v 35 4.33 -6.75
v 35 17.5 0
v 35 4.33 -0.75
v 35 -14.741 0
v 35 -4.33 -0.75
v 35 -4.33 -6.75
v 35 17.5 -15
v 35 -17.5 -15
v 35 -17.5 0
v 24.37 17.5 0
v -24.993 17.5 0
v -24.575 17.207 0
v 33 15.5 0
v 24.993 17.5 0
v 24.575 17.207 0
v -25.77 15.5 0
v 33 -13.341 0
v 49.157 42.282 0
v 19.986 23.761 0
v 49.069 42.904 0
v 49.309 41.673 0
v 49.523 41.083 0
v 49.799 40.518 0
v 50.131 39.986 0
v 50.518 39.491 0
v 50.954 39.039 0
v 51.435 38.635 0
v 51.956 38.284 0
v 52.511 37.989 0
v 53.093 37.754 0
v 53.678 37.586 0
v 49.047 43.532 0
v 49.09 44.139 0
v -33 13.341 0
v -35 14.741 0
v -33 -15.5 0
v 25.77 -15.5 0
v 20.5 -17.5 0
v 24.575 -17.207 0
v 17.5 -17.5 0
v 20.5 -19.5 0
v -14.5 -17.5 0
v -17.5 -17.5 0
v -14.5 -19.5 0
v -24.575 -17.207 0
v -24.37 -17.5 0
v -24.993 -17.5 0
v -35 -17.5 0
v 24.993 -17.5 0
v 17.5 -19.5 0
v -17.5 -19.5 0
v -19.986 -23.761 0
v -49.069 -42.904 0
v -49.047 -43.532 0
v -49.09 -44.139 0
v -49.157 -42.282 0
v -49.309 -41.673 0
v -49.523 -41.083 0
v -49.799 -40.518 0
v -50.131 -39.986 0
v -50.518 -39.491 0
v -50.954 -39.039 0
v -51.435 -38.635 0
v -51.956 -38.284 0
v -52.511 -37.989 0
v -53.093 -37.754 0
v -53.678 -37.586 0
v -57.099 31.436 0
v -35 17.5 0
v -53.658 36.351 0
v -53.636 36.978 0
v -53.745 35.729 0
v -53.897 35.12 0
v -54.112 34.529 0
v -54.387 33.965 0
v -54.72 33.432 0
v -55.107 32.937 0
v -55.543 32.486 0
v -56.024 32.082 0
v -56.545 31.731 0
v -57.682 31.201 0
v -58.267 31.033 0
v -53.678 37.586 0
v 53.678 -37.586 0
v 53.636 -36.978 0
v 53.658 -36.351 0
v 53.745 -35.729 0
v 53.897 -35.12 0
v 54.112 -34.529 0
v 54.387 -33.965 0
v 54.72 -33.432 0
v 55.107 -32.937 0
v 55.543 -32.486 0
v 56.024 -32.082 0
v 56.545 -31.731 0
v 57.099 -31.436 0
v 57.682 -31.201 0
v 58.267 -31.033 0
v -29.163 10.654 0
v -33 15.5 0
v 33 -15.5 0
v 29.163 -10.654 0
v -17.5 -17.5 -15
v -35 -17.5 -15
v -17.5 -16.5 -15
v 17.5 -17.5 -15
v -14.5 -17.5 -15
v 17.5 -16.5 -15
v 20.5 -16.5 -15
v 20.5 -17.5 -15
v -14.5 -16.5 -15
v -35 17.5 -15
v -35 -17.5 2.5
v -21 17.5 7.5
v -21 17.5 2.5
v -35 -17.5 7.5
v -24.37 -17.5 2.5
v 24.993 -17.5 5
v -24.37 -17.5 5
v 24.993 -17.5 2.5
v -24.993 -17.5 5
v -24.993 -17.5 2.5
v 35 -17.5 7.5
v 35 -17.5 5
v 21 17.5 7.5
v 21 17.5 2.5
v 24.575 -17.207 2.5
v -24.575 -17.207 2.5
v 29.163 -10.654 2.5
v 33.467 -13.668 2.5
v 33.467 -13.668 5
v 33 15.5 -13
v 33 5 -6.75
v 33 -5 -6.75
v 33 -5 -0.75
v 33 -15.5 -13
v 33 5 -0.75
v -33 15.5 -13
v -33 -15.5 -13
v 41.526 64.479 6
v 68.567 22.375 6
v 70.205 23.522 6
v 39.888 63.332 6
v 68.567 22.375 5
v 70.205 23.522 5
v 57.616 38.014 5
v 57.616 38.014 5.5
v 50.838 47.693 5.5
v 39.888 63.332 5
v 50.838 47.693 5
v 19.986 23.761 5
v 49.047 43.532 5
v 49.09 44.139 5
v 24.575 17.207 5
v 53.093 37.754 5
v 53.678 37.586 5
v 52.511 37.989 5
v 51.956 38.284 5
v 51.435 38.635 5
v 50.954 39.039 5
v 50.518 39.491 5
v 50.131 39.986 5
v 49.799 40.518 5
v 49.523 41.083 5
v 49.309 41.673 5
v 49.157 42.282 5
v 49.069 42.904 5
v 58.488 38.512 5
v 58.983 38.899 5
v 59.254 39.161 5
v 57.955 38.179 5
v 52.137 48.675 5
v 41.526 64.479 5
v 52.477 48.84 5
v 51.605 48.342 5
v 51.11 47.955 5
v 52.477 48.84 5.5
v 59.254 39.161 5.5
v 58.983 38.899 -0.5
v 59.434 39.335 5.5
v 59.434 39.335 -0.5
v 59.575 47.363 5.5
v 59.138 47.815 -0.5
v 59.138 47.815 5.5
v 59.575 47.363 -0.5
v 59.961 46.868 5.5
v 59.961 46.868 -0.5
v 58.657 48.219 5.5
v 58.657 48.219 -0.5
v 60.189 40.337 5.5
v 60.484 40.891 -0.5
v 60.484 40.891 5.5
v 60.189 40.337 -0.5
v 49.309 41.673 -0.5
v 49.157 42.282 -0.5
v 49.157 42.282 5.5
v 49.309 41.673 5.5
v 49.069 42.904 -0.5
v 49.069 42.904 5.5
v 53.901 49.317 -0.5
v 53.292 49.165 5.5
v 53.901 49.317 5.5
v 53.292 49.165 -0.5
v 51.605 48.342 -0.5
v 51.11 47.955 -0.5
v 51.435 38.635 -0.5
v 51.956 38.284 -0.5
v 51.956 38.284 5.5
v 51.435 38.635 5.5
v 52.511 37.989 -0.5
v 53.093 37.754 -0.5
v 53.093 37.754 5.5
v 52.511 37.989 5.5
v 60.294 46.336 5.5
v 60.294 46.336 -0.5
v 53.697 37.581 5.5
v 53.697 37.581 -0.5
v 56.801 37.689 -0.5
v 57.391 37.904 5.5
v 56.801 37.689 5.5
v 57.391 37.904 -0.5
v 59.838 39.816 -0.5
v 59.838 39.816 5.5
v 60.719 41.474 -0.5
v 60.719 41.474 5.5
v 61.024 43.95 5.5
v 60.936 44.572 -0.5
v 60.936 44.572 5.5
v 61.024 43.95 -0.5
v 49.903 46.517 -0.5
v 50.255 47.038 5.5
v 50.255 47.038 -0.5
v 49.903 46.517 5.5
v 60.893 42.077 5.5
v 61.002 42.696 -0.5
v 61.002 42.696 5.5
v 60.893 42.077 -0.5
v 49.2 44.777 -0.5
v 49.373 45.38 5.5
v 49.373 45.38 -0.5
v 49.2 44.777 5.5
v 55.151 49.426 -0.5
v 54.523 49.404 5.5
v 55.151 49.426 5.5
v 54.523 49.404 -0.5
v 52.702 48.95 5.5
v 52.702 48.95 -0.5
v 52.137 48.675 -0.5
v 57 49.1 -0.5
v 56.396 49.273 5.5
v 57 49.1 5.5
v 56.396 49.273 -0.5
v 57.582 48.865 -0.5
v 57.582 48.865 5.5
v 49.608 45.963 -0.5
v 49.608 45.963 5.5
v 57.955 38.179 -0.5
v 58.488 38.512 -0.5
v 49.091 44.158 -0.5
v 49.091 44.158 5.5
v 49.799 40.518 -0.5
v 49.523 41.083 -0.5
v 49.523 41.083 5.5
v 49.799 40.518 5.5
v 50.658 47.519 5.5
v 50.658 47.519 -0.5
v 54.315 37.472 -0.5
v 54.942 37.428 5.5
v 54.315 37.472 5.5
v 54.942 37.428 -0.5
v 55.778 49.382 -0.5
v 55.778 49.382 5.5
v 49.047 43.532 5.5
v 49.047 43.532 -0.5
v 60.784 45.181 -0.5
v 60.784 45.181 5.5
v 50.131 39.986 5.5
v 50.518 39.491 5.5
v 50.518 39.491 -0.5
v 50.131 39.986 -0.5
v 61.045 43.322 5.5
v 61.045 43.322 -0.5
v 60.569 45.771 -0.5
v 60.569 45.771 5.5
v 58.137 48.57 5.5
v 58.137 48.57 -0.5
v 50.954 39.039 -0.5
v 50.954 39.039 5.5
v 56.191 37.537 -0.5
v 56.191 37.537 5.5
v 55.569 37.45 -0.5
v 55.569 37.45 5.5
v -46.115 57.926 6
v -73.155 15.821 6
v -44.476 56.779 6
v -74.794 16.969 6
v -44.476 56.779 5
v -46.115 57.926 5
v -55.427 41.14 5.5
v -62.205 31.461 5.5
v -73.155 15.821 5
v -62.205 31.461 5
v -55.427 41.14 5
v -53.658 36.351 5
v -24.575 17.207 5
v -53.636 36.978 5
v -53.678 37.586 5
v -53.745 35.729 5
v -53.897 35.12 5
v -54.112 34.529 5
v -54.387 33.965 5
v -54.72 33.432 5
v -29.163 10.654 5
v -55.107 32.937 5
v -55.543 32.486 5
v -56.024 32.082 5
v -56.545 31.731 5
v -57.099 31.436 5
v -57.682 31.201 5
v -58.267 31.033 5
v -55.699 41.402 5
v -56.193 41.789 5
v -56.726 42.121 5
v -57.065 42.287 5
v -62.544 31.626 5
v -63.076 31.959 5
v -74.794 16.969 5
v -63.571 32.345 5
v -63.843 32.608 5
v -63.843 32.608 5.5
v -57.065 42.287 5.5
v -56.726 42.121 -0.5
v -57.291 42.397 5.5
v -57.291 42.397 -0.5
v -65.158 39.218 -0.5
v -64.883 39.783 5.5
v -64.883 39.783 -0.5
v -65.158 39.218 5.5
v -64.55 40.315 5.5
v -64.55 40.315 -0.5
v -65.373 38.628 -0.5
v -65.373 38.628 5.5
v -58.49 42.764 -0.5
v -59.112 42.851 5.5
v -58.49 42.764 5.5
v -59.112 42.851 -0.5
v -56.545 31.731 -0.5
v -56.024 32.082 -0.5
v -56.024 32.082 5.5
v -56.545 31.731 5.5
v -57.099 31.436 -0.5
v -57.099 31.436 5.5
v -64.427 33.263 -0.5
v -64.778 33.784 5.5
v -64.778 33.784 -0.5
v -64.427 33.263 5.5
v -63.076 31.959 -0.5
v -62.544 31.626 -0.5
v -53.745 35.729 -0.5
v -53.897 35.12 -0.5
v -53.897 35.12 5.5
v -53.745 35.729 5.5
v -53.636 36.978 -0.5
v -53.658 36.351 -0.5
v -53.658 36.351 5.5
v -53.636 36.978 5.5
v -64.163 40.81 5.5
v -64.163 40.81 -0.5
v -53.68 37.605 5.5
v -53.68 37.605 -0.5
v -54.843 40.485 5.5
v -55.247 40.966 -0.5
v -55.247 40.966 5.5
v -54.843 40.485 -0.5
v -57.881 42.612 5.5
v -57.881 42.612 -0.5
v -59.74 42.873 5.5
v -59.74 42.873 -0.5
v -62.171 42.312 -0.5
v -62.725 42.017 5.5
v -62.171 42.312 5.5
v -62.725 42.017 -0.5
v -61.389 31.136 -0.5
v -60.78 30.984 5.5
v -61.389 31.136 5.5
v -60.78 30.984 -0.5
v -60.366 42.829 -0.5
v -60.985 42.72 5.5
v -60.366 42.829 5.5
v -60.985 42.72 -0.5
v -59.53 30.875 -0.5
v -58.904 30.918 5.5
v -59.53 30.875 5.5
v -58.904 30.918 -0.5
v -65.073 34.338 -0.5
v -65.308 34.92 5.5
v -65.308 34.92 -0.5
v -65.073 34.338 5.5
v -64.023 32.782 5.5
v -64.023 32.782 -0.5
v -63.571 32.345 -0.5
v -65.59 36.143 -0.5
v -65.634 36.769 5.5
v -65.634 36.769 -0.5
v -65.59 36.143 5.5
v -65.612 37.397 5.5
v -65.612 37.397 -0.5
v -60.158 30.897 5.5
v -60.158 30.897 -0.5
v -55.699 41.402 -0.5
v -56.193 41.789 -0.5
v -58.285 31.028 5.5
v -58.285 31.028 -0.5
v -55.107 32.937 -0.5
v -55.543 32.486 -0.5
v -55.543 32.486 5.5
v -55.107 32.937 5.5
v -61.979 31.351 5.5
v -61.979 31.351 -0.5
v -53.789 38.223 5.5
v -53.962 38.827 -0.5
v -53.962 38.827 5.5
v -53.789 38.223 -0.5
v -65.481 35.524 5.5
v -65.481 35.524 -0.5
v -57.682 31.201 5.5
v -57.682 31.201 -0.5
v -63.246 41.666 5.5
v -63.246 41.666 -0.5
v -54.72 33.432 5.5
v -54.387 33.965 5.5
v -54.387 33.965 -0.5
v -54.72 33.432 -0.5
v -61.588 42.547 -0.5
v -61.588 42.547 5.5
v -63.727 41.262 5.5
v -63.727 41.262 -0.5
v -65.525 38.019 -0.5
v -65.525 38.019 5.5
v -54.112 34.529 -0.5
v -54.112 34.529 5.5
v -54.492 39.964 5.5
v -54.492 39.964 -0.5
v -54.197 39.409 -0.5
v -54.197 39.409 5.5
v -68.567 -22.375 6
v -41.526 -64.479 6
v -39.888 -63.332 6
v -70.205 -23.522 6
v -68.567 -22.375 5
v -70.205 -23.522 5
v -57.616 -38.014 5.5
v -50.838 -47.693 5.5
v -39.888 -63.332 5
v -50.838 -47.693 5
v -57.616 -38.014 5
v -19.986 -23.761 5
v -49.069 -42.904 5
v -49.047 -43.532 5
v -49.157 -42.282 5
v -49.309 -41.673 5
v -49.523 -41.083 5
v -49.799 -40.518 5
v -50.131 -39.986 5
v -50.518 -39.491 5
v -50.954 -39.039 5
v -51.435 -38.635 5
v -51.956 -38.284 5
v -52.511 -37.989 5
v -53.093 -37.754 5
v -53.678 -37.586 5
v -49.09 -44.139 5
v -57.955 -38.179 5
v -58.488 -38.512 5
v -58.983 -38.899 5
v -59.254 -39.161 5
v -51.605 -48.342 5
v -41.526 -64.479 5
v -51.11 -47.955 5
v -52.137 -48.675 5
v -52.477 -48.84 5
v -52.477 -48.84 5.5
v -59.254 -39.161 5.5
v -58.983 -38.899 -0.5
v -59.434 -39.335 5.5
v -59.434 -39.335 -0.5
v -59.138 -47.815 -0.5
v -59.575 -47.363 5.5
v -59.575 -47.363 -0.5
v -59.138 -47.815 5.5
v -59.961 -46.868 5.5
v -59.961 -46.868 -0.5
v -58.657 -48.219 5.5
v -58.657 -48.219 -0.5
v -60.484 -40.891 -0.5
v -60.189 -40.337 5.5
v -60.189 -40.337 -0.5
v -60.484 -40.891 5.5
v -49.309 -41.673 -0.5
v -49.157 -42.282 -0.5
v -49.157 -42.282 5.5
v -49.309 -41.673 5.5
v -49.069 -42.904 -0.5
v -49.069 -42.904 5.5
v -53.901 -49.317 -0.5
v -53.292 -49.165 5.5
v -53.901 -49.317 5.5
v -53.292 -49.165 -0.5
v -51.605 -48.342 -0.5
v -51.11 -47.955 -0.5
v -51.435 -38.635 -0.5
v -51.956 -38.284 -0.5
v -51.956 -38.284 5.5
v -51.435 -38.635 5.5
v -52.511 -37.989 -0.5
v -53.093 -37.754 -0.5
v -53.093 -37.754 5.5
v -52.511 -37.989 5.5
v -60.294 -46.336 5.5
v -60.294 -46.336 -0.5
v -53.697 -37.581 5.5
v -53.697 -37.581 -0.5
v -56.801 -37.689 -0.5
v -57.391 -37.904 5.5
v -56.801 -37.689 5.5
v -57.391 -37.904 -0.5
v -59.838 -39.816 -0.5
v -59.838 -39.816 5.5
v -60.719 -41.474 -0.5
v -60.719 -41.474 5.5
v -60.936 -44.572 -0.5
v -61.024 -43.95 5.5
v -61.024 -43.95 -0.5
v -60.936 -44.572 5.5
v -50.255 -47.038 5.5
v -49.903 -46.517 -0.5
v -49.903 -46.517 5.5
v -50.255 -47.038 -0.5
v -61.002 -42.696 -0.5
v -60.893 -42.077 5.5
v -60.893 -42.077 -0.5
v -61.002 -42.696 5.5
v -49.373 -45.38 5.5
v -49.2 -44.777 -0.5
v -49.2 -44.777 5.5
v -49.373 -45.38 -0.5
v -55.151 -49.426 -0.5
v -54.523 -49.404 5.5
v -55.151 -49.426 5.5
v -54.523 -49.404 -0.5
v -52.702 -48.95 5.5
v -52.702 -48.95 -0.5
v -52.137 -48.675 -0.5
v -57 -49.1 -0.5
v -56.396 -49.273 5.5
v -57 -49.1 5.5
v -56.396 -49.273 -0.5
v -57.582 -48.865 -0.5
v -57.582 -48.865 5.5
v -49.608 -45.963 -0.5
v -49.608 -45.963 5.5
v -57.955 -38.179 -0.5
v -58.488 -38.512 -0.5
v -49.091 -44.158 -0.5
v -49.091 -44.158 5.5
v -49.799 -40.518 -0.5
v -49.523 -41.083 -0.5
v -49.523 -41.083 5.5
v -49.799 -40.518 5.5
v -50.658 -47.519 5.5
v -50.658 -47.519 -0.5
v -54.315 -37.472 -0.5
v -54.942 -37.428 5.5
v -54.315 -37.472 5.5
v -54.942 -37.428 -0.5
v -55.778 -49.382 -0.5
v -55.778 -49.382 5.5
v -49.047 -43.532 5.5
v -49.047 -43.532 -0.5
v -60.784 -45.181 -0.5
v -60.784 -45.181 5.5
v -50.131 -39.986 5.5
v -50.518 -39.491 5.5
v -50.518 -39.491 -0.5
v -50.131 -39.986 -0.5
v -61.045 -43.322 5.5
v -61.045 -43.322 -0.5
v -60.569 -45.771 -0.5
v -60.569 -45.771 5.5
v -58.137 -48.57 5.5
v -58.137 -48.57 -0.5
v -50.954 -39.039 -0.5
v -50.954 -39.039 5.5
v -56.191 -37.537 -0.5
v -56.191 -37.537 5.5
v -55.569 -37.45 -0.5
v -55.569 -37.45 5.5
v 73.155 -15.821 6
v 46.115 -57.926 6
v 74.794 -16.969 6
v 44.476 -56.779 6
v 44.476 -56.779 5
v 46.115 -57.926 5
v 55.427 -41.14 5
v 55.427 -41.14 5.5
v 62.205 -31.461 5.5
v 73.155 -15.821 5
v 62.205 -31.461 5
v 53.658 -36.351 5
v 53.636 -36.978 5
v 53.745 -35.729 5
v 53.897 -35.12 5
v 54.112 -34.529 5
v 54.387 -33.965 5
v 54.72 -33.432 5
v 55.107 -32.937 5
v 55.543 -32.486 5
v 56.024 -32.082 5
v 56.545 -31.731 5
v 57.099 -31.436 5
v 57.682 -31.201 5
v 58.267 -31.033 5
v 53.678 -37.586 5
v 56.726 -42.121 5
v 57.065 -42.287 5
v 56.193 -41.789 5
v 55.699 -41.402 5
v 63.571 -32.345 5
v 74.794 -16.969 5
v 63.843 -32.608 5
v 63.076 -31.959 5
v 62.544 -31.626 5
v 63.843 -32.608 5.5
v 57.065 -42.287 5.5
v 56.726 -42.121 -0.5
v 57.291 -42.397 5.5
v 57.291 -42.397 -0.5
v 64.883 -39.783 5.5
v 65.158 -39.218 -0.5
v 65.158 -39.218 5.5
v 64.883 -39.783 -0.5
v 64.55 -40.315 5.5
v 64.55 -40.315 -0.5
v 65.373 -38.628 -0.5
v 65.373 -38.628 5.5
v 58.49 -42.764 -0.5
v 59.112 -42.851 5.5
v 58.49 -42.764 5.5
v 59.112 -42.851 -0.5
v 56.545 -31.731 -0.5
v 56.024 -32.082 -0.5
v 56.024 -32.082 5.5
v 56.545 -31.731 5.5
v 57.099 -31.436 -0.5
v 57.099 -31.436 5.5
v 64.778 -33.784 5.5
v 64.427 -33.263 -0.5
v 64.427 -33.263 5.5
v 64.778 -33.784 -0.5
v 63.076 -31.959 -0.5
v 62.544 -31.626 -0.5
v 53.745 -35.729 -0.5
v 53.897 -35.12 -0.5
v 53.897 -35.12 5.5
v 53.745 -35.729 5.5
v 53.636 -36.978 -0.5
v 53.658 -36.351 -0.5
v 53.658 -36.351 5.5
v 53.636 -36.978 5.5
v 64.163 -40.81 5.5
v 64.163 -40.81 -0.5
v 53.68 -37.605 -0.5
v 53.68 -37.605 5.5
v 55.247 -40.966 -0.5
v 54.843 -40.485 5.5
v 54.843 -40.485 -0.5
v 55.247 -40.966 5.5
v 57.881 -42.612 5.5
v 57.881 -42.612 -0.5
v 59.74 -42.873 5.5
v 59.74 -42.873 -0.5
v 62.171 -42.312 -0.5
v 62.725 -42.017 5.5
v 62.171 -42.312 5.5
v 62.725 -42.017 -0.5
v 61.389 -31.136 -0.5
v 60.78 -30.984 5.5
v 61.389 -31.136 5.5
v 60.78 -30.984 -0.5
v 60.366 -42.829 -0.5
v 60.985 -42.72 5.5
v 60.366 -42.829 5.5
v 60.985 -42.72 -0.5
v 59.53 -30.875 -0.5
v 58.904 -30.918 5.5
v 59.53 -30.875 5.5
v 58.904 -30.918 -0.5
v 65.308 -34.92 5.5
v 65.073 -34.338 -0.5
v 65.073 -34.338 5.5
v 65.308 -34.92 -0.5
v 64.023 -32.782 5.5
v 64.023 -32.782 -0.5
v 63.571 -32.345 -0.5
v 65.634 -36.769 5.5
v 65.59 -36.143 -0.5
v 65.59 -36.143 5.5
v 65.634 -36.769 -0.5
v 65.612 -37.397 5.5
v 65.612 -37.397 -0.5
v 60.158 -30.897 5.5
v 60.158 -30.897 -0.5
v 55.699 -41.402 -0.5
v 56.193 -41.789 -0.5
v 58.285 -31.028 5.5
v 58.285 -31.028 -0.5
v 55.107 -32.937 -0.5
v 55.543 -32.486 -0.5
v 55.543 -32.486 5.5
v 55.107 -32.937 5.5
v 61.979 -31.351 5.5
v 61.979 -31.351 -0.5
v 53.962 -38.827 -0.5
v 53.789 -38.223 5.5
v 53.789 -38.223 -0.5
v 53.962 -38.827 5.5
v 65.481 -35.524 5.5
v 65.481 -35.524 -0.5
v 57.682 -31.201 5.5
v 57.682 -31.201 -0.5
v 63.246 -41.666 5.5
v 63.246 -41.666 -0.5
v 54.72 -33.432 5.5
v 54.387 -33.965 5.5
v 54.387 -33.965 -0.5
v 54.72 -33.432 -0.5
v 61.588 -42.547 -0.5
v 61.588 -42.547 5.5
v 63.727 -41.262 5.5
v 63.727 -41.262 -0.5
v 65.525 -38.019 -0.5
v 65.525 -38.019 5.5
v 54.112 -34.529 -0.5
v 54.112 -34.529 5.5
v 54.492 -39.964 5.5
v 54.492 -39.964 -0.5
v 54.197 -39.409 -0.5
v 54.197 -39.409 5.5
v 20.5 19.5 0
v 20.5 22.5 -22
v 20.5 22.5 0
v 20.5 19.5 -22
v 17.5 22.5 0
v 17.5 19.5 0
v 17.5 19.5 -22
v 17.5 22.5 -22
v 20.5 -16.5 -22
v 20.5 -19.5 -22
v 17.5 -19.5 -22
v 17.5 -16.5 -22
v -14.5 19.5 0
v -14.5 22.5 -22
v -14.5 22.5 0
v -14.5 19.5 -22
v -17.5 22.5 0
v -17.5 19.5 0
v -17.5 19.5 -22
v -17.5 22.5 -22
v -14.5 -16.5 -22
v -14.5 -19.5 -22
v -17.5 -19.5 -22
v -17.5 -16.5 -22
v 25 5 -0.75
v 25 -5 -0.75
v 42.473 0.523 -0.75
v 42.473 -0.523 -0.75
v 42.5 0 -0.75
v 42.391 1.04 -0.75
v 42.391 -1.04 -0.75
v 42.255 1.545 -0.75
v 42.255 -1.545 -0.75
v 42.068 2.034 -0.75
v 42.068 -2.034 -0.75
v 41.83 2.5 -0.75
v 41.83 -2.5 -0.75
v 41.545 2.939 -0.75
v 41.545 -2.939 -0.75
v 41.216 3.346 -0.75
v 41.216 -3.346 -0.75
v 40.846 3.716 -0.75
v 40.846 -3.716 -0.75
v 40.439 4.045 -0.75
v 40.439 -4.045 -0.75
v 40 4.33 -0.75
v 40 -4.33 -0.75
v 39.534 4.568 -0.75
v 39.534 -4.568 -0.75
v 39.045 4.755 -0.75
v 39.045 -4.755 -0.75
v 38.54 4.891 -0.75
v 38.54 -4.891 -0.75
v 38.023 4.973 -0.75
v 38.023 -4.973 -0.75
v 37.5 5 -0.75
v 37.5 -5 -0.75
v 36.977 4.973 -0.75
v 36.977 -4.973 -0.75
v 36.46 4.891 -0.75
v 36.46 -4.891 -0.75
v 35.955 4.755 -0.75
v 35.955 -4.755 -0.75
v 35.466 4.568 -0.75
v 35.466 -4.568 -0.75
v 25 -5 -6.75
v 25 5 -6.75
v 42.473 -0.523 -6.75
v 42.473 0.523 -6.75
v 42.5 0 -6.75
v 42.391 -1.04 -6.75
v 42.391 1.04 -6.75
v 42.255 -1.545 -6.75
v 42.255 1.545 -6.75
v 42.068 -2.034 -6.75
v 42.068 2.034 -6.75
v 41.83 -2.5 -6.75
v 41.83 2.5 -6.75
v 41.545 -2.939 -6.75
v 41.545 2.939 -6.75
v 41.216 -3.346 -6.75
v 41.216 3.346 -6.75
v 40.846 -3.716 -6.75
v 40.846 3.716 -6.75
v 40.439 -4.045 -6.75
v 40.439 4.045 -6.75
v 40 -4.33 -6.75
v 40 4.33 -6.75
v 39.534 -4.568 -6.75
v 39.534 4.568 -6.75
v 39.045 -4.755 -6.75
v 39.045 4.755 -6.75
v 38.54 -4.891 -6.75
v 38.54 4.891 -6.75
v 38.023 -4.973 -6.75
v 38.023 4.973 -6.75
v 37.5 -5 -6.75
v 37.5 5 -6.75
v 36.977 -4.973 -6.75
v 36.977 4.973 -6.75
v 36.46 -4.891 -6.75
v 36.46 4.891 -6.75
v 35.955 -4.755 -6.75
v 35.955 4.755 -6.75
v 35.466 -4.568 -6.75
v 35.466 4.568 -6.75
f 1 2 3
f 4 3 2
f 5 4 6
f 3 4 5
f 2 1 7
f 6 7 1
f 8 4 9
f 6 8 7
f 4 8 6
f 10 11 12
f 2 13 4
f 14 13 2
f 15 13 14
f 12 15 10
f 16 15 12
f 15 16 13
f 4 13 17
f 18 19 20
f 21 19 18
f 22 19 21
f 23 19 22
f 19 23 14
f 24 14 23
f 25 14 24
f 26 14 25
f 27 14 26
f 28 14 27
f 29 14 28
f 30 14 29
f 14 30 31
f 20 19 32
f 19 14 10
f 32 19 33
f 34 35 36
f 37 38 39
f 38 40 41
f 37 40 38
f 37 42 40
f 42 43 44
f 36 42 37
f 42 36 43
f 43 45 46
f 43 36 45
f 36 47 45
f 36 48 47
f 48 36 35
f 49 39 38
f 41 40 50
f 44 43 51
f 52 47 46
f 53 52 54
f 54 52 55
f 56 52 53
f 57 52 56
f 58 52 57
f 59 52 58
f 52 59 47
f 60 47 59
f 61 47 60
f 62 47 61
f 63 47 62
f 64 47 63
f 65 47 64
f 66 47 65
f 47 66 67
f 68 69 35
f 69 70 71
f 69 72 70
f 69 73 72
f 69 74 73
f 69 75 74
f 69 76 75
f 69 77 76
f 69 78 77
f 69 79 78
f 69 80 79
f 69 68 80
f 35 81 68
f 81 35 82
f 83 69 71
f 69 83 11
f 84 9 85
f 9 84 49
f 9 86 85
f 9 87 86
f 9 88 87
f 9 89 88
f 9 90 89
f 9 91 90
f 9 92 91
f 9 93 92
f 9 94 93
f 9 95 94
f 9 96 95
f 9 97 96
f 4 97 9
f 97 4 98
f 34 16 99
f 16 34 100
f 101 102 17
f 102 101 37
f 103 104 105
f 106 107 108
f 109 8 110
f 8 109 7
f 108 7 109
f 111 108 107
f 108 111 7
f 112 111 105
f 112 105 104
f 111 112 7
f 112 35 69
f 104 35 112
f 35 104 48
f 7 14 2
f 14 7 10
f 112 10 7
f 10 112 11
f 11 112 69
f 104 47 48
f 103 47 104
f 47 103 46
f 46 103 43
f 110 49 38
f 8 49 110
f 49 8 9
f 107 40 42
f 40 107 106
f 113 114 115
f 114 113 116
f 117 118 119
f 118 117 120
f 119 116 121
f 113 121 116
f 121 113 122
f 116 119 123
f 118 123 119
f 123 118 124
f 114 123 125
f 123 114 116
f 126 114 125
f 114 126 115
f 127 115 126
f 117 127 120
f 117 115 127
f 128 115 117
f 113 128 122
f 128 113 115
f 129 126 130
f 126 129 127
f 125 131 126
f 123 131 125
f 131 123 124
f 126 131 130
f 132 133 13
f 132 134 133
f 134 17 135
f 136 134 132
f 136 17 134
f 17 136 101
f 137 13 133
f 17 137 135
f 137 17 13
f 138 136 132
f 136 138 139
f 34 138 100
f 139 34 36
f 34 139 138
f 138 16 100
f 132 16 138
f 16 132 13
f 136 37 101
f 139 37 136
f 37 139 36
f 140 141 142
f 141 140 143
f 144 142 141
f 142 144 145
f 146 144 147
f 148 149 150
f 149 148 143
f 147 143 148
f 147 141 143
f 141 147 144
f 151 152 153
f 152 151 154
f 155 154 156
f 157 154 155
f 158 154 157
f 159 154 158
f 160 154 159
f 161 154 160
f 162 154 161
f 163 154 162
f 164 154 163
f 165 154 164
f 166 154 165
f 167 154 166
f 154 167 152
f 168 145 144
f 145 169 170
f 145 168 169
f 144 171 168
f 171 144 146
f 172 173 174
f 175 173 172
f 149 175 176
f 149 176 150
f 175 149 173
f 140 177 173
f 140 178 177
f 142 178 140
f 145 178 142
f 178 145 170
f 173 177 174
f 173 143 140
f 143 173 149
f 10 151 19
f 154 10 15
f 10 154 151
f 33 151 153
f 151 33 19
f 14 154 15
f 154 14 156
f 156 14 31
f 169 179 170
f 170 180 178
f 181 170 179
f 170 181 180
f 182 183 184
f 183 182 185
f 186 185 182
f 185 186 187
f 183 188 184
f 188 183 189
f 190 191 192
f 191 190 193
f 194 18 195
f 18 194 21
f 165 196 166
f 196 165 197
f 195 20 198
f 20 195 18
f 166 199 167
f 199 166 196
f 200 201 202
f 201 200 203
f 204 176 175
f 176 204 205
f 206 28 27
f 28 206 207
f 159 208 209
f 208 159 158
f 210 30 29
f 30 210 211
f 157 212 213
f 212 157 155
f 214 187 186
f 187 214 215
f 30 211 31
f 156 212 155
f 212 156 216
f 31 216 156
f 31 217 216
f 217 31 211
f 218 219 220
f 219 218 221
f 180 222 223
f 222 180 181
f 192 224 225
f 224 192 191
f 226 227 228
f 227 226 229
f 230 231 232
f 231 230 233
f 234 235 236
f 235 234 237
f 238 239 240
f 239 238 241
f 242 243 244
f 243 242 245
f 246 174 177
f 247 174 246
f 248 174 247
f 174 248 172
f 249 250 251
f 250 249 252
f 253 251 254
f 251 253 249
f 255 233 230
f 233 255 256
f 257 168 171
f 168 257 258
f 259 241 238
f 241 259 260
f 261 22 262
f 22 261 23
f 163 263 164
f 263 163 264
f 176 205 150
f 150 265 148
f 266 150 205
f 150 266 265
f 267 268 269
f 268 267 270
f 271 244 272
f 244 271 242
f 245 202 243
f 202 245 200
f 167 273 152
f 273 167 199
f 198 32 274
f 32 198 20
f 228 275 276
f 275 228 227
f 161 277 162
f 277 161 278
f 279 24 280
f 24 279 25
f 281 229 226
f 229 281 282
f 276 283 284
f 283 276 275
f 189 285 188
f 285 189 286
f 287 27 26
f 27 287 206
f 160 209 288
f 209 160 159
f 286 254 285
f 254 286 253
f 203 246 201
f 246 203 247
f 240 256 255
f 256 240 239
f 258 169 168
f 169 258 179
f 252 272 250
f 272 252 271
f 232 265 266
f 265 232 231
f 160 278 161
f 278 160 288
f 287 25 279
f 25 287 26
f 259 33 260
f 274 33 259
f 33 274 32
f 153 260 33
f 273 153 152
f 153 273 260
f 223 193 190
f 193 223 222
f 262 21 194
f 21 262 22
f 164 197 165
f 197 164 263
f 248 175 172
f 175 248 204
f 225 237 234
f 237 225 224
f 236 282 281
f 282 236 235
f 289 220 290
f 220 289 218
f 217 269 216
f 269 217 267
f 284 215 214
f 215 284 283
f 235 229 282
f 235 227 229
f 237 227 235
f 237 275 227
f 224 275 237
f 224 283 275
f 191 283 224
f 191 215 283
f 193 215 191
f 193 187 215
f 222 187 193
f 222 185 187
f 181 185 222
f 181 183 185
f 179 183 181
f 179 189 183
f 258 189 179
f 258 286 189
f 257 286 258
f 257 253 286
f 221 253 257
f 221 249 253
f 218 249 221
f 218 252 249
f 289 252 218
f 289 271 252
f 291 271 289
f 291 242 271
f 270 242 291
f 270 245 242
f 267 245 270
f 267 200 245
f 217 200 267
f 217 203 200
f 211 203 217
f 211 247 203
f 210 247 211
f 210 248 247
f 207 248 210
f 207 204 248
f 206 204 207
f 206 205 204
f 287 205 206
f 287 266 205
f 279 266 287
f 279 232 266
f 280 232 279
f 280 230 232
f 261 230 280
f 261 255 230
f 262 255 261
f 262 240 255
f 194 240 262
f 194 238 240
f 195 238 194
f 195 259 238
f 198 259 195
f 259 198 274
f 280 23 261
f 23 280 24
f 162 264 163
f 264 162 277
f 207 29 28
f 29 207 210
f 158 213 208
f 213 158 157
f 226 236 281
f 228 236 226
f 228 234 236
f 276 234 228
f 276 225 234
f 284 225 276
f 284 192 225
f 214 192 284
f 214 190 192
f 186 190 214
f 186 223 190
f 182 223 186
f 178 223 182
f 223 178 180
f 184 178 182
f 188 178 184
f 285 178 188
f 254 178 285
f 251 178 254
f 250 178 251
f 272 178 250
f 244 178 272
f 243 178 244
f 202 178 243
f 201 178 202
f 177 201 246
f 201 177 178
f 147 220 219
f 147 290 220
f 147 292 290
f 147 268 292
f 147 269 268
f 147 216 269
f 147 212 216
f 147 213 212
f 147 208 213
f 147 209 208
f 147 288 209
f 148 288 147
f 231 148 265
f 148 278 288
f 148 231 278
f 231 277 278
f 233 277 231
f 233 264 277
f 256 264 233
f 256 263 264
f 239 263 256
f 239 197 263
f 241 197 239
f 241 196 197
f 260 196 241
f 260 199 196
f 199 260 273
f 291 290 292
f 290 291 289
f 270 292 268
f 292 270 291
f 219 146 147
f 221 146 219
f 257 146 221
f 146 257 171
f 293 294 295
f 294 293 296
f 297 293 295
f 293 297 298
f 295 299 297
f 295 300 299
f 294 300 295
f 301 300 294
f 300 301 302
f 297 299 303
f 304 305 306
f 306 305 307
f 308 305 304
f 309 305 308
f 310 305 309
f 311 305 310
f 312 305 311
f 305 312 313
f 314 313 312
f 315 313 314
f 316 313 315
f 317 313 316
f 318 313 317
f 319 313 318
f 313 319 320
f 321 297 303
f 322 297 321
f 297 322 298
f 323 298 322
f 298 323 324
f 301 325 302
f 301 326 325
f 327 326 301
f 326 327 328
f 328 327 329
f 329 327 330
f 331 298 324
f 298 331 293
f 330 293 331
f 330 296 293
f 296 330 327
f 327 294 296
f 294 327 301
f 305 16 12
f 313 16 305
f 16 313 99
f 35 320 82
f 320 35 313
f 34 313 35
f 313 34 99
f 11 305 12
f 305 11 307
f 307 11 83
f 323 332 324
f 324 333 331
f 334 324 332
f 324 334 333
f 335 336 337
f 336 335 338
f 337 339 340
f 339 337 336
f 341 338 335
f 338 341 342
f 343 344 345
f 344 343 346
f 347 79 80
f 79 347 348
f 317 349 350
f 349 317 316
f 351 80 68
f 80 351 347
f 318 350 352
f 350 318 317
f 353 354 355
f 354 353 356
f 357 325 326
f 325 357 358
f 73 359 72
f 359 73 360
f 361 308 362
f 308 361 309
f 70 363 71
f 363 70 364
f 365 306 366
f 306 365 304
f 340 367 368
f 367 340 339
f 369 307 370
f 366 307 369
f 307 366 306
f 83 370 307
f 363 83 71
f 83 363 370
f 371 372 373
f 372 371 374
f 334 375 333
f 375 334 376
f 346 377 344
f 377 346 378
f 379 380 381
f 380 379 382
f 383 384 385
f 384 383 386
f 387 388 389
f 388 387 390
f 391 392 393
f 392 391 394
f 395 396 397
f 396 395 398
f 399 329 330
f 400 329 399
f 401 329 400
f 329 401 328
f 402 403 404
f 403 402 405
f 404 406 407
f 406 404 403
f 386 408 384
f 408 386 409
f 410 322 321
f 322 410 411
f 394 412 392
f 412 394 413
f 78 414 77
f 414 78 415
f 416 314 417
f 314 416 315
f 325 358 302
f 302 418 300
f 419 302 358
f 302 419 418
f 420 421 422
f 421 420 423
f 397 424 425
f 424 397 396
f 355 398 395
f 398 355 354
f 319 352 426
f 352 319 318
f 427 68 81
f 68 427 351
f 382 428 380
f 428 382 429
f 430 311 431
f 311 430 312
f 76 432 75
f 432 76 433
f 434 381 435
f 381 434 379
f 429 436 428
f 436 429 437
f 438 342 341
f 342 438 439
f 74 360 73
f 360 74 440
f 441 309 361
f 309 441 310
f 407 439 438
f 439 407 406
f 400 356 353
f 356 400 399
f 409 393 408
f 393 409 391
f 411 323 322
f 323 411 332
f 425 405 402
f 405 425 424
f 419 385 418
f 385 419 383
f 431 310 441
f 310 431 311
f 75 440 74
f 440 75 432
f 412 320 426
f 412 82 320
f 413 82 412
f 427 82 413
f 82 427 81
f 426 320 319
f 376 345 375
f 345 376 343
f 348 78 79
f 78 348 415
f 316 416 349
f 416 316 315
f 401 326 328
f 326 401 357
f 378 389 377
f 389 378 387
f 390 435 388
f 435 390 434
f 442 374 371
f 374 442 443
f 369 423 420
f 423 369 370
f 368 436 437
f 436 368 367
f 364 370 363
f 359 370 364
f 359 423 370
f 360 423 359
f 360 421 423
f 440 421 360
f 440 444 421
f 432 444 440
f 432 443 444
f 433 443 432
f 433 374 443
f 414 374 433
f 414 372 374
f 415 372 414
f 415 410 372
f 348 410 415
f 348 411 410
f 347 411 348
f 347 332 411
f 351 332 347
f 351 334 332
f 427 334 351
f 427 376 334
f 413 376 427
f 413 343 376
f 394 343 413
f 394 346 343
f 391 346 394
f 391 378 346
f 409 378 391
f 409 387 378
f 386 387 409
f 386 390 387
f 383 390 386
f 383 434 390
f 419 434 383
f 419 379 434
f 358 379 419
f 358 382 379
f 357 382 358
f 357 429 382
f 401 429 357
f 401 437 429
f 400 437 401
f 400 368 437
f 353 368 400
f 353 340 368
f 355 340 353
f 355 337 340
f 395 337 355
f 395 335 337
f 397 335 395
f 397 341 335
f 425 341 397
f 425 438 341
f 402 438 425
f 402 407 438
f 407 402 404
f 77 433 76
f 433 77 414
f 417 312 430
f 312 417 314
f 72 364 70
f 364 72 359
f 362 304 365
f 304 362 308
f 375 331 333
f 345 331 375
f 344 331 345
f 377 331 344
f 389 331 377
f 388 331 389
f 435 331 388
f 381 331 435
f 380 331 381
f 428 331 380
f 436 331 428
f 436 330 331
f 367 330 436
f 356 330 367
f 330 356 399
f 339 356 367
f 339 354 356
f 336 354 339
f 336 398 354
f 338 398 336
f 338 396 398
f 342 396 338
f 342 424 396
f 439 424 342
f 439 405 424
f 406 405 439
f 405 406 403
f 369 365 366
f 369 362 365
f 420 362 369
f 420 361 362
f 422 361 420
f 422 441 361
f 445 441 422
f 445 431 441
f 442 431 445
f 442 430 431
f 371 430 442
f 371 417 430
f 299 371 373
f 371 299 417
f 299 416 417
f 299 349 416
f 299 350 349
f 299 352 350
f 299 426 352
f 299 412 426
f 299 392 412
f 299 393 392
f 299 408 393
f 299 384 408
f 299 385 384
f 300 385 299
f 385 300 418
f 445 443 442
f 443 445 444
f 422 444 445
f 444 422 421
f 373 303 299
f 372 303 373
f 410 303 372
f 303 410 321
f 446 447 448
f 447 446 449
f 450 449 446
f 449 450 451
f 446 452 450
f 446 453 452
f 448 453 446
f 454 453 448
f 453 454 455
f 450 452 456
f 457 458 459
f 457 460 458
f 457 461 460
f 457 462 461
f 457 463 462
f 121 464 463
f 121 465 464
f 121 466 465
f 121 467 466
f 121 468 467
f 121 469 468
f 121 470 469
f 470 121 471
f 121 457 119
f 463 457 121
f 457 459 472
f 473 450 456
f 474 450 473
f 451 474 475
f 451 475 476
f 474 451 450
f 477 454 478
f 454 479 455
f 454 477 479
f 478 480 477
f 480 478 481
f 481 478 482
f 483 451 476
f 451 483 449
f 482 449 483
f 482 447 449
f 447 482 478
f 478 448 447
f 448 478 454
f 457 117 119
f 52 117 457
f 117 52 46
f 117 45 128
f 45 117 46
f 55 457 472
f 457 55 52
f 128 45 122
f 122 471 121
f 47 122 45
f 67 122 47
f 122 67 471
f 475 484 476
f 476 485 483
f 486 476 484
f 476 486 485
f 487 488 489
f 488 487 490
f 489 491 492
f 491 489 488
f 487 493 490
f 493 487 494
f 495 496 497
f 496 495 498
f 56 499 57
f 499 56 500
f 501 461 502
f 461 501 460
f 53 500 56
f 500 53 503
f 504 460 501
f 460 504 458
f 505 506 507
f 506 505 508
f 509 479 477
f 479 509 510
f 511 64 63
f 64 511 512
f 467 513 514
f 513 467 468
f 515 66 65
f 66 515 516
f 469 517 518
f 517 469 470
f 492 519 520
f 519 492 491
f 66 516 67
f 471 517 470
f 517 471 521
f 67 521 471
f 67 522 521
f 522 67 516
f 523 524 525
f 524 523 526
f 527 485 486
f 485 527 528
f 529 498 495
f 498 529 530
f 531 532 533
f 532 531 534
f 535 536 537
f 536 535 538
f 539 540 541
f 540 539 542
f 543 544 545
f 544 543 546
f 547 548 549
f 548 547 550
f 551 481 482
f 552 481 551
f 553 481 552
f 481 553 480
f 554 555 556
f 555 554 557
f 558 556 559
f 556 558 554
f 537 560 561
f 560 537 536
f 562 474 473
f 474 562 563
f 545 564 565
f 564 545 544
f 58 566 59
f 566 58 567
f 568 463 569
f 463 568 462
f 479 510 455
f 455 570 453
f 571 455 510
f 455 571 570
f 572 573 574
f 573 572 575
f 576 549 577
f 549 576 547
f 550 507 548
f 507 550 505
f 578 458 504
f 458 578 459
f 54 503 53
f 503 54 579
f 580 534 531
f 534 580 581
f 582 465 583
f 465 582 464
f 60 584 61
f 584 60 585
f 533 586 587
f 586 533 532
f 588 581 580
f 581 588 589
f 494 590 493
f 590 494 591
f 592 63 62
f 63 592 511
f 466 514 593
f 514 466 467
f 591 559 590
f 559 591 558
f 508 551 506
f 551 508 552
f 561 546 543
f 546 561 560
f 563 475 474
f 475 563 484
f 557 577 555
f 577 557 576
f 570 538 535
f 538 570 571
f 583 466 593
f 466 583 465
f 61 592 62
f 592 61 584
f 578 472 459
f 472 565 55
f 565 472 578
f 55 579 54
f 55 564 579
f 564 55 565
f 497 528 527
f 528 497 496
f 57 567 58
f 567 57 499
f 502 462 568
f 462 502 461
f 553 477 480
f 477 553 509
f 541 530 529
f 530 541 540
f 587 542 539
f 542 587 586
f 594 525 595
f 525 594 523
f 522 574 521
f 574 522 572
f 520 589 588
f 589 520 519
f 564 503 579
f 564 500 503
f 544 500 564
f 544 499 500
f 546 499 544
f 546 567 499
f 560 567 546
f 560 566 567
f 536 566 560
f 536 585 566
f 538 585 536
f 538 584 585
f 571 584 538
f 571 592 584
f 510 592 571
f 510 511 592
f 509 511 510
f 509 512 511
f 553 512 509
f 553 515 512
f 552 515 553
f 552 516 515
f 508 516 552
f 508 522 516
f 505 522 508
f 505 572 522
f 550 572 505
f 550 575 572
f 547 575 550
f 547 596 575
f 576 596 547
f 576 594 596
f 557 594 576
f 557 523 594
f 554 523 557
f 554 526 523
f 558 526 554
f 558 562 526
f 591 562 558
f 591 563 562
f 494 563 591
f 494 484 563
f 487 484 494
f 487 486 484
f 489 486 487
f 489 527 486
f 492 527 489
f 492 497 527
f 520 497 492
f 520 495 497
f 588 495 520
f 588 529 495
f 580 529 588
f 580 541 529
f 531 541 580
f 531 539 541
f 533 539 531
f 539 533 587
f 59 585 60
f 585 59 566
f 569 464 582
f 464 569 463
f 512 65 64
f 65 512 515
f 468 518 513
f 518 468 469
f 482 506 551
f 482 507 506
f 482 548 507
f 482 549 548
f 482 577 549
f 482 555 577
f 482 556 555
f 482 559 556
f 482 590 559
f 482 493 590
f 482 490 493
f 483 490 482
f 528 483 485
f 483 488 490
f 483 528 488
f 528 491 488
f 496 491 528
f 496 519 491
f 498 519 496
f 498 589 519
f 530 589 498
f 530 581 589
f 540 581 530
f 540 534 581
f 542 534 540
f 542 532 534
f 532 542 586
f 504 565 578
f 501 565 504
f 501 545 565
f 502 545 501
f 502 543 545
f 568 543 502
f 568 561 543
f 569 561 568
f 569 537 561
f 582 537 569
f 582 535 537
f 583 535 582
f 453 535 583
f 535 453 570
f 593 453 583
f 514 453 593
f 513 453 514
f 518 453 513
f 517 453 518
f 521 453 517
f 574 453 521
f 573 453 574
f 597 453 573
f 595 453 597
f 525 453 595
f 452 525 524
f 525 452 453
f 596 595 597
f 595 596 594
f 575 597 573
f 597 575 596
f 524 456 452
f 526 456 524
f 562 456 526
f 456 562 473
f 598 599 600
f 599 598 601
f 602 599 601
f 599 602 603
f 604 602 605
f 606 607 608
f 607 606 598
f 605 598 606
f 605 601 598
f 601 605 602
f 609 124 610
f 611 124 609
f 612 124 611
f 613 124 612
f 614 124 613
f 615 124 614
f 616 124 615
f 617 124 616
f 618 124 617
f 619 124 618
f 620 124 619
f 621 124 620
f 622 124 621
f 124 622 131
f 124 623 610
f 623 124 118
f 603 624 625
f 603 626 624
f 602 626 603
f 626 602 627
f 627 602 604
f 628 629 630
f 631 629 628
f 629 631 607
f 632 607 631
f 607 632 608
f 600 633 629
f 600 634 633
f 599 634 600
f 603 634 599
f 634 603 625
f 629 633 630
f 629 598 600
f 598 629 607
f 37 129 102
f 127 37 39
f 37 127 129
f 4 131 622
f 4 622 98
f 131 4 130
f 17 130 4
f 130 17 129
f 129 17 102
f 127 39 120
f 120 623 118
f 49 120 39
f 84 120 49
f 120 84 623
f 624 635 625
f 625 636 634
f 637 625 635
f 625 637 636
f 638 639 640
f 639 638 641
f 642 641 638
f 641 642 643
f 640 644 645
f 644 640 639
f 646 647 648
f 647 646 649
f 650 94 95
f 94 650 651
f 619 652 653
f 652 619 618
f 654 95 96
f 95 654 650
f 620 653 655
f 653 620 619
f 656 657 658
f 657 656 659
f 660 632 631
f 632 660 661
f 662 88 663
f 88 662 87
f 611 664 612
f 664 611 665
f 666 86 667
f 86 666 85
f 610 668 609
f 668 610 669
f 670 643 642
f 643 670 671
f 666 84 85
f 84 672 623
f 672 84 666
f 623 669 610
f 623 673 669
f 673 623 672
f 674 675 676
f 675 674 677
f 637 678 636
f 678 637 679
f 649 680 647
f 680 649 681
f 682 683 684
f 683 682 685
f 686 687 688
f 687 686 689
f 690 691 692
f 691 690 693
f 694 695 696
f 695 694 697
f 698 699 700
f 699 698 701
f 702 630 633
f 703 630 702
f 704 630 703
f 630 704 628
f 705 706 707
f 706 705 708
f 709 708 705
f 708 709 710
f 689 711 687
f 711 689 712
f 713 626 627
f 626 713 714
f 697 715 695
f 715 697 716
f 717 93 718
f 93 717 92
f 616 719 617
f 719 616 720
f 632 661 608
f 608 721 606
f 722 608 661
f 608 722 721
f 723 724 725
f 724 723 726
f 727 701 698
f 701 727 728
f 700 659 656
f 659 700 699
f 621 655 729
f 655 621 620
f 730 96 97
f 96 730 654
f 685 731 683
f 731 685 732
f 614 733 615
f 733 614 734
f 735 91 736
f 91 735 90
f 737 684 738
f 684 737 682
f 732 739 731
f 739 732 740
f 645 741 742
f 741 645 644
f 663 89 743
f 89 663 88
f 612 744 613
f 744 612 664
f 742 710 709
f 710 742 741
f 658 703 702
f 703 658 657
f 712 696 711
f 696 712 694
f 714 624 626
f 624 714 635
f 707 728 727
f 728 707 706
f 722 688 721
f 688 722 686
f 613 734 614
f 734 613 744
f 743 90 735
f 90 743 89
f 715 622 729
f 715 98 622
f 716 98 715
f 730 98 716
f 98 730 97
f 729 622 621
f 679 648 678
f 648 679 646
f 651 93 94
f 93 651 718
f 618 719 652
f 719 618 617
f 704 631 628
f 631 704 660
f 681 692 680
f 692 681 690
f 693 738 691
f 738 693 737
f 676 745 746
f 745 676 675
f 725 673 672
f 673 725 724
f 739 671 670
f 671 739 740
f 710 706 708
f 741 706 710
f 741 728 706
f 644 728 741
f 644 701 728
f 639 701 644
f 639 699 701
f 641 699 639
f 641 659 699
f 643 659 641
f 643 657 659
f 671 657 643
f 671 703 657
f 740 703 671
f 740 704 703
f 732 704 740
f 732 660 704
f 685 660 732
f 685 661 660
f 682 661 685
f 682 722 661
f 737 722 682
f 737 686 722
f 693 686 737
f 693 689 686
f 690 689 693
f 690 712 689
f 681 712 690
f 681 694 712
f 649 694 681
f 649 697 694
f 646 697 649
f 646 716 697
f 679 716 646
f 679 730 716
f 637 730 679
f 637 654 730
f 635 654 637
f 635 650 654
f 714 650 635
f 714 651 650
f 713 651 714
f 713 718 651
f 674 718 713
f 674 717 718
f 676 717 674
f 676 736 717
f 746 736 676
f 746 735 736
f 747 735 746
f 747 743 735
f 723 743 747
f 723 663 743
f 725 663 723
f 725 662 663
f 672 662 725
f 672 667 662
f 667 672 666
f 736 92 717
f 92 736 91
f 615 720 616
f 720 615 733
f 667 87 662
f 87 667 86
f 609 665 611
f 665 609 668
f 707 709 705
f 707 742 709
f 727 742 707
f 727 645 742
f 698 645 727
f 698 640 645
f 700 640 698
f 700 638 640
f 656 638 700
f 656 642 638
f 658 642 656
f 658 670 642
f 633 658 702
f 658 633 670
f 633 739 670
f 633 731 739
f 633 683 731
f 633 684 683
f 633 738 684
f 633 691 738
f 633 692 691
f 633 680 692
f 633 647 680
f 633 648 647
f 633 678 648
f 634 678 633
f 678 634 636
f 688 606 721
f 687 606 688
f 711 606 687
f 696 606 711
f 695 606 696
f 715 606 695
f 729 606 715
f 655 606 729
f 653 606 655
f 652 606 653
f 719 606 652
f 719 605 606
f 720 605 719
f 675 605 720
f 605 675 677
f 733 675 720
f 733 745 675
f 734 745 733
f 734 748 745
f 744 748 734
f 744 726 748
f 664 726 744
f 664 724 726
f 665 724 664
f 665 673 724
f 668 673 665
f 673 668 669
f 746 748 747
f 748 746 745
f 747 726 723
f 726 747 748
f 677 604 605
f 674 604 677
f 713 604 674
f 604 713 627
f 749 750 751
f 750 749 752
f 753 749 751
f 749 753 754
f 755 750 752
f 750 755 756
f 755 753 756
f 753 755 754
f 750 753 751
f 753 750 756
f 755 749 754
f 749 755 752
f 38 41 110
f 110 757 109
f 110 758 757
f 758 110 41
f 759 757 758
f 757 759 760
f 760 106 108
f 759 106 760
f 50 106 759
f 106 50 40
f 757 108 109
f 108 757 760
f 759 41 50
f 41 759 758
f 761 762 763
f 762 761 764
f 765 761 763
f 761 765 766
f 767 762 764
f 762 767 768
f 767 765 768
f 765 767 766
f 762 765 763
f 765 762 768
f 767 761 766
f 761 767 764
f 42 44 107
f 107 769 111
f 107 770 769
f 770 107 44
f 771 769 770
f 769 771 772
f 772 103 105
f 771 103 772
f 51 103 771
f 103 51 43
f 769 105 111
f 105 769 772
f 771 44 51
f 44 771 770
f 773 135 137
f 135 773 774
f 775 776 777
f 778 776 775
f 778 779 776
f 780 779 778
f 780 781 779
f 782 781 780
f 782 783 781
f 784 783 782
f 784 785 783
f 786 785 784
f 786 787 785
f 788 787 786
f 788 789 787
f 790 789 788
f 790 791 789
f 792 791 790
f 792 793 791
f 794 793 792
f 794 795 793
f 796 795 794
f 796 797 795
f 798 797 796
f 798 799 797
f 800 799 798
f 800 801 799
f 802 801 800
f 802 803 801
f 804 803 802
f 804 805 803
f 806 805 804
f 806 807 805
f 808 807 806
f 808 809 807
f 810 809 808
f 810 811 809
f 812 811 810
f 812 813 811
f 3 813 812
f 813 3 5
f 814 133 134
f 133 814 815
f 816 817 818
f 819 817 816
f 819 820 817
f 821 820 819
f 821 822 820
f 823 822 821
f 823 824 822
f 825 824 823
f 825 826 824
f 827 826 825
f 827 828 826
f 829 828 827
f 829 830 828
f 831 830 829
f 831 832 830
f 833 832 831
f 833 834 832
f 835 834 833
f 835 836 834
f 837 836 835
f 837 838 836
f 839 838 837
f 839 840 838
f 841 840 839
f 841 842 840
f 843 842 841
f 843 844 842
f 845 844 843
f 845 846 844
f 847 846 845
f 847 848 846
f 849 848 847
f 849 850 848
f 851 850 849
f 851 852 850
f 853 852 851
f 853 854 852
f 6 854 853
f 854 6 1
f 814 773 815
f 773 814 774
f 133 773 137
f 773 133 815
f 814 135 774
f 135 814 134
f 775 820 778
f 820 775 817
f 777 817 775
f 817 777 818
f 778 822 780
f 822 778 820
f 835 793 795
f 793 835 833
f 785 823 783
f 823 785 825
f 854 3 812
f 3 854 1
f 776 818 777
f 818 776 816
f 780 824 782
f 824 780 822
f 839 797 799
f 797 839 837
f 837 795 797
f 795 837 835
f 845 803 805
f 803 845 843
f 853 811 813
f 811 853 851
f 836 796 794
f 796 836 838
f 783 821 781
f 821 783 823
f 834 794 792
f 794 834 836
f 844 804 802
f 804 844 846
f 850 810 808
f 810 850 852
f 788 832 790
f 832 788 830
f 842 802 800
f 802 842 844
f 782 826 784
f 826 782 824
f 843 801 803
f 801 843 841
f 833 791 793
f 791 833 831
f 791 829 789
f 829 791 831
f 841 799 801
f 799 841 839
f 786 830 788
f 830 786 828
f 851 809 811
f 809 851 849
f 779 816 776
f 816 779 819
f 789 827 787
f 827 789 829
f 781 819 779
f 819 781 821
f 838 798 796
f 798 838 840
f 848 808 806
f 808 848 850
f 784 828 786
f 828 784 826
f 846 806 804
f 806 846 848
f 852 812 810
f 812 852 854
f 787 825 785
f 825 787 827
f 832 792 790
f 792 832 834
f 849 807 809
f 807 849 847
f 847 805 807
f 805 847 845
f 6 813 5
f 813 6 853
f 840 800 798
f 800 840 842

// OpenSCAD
///////////////////////////////////////////////////////
// DRONE ESTILO “MAVIC-LIKE” EM OPENSCAD
// (modelo simplificado e aproximado)
// Aluna: Cássia Santos
///////////////////////////////////////////////////////

// ----------- PARAMETROS GERAIS -----------
body_length = 70;       // comprimento do corpo
body_width = 35;        // largura do corpo
body_height = 15;       // altura do corpo

arm_length = 40;        // comprimento dos braços
arm_width = 8;          // largura dos braços
arm_height = 5;         // altura dos braços

motor_radius = 6;       // raio dos motores
motor_height = 6;       // altura dos motores

propeller_length = 25;  // comprimento da pá
propeller_width = 2;    // largura da pá
propeller_thickness = 1;// espessura da pá

landing_leg_height = 22;   // altura do "pé" de pouso
landing_leg_thickness = 3; // espessura do "pé" de pouso

camera_radius = 5;         // “tamanho” da lente/cilindro da câmera
camera_box = [10,10,6];    // caixa retangular em volta da câmera

// Para ajudar a visualizar melhor
$fn = 60;

// ----------- CORPO PRINCIPAL -----------
module drone_body() {
    // cria uma forma mais “aerodinâmica” usando hull() de dois retângulos
    // e um polígono para o topo. É apenas um truque simples de design.
    color("gray")
    difference() {
        union() {
            // Parte inferior (retângulo extrudado)
            translate([0,0,-body_height/2])
            cube([body_length, body_width, body_height], center=true);
            
            // Parte superior (tentando criar uma leve curvatura)
            translate([-body_length/2, -body_width/2, body_height/2 - 5]) 
            linear_extrude(height=5, center=false, convexity=10)
            polygon(points=[
                [0,0],
                [body_length,0],
                [body_length*0.8, body_width],
                [body_length*0.2, body_width]
            ]);
        }
        // “Escavando” o interior para simular algo mais oco
        translate([0,0,-(body_height/2 -1)])
        cube([body_length-4, body_width-4, body_height-2], center=true);
    }
}

// ----------- BRAÇO COM MOTOR E HÉLICE -----------
module drone_arm(angle=0) {
    // Rotacionamos o braço num certo ângulo em relação ao corpo
    color("red")
    rotate([0,0,angle]) {
        // Mover para fora do corpo
        translate([body_length/2 - 5, 0, 0]) {
            // Criar o braço
            cube([arm_length, arm_width, arm_height], center=false);
            
            // Criar o motor
            translate([arm_length, arm_width/2, arm_height/2])
            cylinder(h = motor_height, r = motor_radius, center=true);

            // Criar as hélices
            translate([arm_length, arm_width/2, arm_height/2 + motor_height/2])
            propellers();
        }
    }
}

// ----------- HELICES -----------
module propellers() {
    // Duas pás em cruz, rotacionadas em 90 graus
    for (rot = [90,-90]) {
        rotate([0,0,rot]) {
            translate([-propeller_length/2, 0, 0]) {
                cube([propeller_length, propeller_width, propeller_thickness], center=true);
            }
        }
    }
}

// ----------- PERNAS DE POUSO -----------
module landing_legs() {
    // Pernas dianteiras e traseiras (duplas)
    // Ajuste de posições para ficarem abaixo do corpo
    leg_offset_x = body_length/4;
    leg_offset_y = body_width/2 + 2;
    leg_width = 3;

    // Pernas frontais
    for (sign=[1,-1]) {
        translate([leg_offset_x, sign*leg_offset_y, -landing_leg_height]) {
            color("black")
            cube([leg_width, leg_width, landing_leg_height], center=false);
        }
    }

    // Pernas traseiras
    for (sign=[1,-1]) {
        translate([-leg_offset_x, sign*leg_offset_y, -landing_leg_height]) {
            color("black")
            cube([leg_width, leg_width, landing_leg_height], center=false);
        }
    }
}

// ----------- CAMERA FRONTAL -----------
module front_camera() {
    // Vamos criar uma pequena “caixa” frontal e uma lente
    color("black")
    translate([body_length/2 - 5, 0, -body_height/4]) {
        // Caixa protetora da câmera
        cube(camera_box, center=true);
        
        // Lente
        translate([camera_box[0]/2 + camera_radius/2, 0, 0])
        cylinder(h = camera_box[2], r = camera_radius, center=true);
    }
}

// ----------- MONTAGEM GERAL -----------
module drone_mavic_like() {
    // Corpo
    drone_body();

    // Braços (quatro, em ângulos específicos)
    // Ajusta a rotação para ficar em diagonal
    // Ex: 35° e 145° para a frente, 215° e 325° para trás (aproximado)
    drone_arm(35);
    drone_arm(145);
    drone_arm(215);
    drone_arm(325);

    // Pernas de pouso
    landing_legs();

    // Câmera frontal
    front_camera();
}

// Chamando o módulo principal
drone_mavic_like();
